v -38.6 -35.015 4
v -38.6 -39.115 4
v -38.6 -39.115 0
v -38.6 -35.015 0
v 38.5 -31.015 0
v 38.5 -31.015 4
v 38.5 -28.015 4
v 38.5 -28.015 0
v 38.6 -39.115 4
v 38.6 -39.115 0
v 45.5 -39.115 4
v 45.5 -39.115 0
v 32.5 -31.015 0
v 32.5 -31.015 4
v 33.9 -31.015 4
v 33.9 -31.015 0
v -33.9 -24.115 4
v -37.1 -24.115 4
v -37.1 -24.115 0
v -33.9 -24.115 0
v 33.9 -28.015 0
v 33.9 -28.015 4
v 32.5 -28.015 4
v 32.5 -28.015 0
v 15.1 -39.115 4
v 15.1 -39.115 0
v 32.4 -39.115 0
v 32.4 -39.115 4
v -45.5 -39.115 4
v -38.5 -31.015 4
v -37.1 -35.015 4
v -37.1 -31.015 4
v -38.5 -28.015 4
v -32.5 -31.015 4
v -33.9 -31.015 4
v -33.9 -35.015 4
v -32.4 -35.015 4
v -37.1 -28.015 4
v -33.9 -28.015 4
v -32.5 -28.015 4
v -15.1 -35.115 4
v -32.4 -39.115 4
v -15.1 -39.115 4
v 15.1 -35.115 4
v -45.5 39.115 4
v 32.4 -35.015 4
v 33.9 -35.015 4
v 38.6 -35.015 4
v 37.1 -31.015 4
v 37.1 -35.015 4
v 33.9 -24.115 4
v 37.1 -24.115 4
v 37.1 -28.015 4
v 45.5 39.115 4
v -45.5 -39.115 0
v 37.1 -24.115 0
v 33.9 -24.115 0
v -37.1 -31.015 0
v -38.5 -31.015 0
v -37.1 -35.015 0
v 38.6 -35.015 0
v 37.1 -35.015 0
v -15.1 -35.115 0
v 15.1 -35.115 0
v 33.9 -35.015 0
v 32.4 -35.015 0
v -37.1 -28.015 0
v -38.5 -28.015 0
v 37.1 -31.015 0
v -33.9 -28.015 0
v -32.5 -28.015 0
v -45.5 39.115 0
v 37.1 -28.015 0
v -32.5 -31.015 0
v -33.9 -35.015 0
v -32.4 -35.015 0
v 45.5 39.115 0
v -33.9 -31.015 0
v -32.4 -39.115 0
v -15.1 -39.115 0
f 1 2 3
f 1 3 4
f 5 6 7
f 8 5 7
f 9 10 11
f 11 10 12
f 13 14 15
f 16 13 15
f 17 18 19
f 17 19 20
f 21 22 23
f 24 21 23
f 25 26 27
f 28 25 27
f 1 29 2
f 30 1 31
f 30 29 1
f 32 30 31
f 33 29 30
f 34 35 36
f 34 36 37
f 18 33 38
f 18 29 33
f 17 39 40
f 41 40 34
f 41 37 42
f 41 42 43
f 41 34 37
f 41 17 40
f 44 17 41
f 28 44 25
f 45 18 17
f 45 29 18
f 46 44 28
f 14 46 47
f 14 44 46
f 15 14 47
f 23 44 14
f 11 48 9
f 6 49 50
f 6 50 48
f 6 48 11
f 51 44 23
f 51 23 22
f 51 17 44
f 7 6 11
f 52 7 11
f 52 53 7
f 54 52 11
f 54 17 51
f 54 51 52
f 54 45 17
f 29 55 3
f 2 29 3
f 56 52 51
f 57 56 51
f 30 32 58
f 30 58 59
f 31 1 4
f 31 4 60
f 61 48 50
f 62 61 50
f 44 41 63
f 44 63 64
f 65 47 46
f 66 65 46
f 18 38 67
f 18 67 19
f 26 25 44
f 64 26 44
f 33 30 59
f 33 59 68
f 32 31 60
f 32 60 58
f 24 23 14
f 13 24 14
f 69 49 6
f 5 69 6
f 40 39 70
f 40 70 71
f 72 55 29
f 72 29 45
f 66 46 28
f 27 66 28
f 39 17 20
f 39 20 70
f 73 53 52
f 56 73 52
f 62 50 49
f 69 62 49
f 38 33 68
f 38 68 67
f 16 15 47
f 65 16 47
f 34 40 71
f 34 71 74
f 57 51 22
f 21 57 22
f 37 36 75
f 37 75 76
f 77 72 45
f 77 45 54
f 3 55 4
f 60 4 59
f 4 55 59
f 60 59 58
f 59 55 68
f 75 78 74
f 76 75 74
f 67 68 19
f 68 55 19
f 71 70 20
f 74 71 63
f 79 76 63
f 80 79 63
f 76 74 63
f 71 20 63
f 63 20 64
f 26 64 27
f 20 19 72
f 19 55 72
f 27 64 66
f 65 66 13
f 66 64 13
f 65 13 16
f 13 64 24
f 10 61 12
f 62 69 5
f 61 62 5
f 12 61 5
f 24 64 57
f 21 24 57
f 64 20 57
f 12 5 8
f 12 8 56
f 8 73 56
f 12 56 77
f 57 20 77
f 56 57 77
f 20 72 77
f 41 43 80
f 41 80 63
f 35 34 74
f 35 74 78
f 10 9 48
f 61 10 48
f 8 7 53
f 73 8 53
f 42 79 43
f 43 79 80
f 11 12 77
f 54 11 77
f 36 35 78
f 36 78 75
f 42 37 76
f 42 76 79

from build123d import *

# Parameters (mm, degrees)
SKETCH1_W           = 91
SKETCH1_H           = 78.23
BOSS_EXTRUDE1_DEPTH = 4
CUT_EXTRUDE2_DEPTH  = 61.135124719
SKETCH3_W           = 30.2
SKETCH3_H           = 4
CUT_EXTRUDE3_DEPTH  = 4


with BuildPart() as part:
    # Sketch1 → Boss-Extrude1 (new body)
    with BuildSketch(Plane.XY):
        Rectangle(SKETCH1_W, SKETCH1_H)
    extrude(amount=BOSS_EXTRUDE1_DEPTH)

    # Sketch2 → Cut-Extrude2 (cut, through all)
    with BuildSketch(Plane.XY.offset(4)):
        Polygon((38.6, -39.115), (38.6, -35.015), (37.1, -35.015), (37.1, -31.015), (38.5, -31.015), (38.5, -28.015), (37.1, -28.015), (37.1, -24.115), (33.9, -24.115), (33.9, -28.015), (32.5, -28.015), (32.5, -31.015), (33.9, -31.015), (33.9, -35.015), (32.4, -35.015), (32.4, -39.115), align=None)
        Polygon((-32.4, -39.115), (-38.6, -39.115), (-38.6, -35.015), (-37.1, -35.015), (-37.1, -31.015), (-38.5, -31.015), (-38.5, -28.015), (-37.1, -28.015), (-37.1, -24.115), (-33.9, -24.115), (-33.9, -28.015), (-32.5, -28.015), (-32.5, -31.015), (-33.9, -31.015), (-33.9, -35.015), (-32.4, -35.015), align=None)
    extrude(amount=-CUT_EXTRUDE2_DEPTH, mode=Mode.SUBTRACT)

    # Sketch3 → Cut-Extrude3 (cut)
    with BuildSketch(Plane.XY.offset(4)):
        with Locations((0, -37.115)):
            Rectangle(SKETCH3_W, SKETCH3_H)
    extrude(amount=-CUT_EXTRUDE3_DEPTH, mode=Mode.SUBTRACT)


solid = part.part
